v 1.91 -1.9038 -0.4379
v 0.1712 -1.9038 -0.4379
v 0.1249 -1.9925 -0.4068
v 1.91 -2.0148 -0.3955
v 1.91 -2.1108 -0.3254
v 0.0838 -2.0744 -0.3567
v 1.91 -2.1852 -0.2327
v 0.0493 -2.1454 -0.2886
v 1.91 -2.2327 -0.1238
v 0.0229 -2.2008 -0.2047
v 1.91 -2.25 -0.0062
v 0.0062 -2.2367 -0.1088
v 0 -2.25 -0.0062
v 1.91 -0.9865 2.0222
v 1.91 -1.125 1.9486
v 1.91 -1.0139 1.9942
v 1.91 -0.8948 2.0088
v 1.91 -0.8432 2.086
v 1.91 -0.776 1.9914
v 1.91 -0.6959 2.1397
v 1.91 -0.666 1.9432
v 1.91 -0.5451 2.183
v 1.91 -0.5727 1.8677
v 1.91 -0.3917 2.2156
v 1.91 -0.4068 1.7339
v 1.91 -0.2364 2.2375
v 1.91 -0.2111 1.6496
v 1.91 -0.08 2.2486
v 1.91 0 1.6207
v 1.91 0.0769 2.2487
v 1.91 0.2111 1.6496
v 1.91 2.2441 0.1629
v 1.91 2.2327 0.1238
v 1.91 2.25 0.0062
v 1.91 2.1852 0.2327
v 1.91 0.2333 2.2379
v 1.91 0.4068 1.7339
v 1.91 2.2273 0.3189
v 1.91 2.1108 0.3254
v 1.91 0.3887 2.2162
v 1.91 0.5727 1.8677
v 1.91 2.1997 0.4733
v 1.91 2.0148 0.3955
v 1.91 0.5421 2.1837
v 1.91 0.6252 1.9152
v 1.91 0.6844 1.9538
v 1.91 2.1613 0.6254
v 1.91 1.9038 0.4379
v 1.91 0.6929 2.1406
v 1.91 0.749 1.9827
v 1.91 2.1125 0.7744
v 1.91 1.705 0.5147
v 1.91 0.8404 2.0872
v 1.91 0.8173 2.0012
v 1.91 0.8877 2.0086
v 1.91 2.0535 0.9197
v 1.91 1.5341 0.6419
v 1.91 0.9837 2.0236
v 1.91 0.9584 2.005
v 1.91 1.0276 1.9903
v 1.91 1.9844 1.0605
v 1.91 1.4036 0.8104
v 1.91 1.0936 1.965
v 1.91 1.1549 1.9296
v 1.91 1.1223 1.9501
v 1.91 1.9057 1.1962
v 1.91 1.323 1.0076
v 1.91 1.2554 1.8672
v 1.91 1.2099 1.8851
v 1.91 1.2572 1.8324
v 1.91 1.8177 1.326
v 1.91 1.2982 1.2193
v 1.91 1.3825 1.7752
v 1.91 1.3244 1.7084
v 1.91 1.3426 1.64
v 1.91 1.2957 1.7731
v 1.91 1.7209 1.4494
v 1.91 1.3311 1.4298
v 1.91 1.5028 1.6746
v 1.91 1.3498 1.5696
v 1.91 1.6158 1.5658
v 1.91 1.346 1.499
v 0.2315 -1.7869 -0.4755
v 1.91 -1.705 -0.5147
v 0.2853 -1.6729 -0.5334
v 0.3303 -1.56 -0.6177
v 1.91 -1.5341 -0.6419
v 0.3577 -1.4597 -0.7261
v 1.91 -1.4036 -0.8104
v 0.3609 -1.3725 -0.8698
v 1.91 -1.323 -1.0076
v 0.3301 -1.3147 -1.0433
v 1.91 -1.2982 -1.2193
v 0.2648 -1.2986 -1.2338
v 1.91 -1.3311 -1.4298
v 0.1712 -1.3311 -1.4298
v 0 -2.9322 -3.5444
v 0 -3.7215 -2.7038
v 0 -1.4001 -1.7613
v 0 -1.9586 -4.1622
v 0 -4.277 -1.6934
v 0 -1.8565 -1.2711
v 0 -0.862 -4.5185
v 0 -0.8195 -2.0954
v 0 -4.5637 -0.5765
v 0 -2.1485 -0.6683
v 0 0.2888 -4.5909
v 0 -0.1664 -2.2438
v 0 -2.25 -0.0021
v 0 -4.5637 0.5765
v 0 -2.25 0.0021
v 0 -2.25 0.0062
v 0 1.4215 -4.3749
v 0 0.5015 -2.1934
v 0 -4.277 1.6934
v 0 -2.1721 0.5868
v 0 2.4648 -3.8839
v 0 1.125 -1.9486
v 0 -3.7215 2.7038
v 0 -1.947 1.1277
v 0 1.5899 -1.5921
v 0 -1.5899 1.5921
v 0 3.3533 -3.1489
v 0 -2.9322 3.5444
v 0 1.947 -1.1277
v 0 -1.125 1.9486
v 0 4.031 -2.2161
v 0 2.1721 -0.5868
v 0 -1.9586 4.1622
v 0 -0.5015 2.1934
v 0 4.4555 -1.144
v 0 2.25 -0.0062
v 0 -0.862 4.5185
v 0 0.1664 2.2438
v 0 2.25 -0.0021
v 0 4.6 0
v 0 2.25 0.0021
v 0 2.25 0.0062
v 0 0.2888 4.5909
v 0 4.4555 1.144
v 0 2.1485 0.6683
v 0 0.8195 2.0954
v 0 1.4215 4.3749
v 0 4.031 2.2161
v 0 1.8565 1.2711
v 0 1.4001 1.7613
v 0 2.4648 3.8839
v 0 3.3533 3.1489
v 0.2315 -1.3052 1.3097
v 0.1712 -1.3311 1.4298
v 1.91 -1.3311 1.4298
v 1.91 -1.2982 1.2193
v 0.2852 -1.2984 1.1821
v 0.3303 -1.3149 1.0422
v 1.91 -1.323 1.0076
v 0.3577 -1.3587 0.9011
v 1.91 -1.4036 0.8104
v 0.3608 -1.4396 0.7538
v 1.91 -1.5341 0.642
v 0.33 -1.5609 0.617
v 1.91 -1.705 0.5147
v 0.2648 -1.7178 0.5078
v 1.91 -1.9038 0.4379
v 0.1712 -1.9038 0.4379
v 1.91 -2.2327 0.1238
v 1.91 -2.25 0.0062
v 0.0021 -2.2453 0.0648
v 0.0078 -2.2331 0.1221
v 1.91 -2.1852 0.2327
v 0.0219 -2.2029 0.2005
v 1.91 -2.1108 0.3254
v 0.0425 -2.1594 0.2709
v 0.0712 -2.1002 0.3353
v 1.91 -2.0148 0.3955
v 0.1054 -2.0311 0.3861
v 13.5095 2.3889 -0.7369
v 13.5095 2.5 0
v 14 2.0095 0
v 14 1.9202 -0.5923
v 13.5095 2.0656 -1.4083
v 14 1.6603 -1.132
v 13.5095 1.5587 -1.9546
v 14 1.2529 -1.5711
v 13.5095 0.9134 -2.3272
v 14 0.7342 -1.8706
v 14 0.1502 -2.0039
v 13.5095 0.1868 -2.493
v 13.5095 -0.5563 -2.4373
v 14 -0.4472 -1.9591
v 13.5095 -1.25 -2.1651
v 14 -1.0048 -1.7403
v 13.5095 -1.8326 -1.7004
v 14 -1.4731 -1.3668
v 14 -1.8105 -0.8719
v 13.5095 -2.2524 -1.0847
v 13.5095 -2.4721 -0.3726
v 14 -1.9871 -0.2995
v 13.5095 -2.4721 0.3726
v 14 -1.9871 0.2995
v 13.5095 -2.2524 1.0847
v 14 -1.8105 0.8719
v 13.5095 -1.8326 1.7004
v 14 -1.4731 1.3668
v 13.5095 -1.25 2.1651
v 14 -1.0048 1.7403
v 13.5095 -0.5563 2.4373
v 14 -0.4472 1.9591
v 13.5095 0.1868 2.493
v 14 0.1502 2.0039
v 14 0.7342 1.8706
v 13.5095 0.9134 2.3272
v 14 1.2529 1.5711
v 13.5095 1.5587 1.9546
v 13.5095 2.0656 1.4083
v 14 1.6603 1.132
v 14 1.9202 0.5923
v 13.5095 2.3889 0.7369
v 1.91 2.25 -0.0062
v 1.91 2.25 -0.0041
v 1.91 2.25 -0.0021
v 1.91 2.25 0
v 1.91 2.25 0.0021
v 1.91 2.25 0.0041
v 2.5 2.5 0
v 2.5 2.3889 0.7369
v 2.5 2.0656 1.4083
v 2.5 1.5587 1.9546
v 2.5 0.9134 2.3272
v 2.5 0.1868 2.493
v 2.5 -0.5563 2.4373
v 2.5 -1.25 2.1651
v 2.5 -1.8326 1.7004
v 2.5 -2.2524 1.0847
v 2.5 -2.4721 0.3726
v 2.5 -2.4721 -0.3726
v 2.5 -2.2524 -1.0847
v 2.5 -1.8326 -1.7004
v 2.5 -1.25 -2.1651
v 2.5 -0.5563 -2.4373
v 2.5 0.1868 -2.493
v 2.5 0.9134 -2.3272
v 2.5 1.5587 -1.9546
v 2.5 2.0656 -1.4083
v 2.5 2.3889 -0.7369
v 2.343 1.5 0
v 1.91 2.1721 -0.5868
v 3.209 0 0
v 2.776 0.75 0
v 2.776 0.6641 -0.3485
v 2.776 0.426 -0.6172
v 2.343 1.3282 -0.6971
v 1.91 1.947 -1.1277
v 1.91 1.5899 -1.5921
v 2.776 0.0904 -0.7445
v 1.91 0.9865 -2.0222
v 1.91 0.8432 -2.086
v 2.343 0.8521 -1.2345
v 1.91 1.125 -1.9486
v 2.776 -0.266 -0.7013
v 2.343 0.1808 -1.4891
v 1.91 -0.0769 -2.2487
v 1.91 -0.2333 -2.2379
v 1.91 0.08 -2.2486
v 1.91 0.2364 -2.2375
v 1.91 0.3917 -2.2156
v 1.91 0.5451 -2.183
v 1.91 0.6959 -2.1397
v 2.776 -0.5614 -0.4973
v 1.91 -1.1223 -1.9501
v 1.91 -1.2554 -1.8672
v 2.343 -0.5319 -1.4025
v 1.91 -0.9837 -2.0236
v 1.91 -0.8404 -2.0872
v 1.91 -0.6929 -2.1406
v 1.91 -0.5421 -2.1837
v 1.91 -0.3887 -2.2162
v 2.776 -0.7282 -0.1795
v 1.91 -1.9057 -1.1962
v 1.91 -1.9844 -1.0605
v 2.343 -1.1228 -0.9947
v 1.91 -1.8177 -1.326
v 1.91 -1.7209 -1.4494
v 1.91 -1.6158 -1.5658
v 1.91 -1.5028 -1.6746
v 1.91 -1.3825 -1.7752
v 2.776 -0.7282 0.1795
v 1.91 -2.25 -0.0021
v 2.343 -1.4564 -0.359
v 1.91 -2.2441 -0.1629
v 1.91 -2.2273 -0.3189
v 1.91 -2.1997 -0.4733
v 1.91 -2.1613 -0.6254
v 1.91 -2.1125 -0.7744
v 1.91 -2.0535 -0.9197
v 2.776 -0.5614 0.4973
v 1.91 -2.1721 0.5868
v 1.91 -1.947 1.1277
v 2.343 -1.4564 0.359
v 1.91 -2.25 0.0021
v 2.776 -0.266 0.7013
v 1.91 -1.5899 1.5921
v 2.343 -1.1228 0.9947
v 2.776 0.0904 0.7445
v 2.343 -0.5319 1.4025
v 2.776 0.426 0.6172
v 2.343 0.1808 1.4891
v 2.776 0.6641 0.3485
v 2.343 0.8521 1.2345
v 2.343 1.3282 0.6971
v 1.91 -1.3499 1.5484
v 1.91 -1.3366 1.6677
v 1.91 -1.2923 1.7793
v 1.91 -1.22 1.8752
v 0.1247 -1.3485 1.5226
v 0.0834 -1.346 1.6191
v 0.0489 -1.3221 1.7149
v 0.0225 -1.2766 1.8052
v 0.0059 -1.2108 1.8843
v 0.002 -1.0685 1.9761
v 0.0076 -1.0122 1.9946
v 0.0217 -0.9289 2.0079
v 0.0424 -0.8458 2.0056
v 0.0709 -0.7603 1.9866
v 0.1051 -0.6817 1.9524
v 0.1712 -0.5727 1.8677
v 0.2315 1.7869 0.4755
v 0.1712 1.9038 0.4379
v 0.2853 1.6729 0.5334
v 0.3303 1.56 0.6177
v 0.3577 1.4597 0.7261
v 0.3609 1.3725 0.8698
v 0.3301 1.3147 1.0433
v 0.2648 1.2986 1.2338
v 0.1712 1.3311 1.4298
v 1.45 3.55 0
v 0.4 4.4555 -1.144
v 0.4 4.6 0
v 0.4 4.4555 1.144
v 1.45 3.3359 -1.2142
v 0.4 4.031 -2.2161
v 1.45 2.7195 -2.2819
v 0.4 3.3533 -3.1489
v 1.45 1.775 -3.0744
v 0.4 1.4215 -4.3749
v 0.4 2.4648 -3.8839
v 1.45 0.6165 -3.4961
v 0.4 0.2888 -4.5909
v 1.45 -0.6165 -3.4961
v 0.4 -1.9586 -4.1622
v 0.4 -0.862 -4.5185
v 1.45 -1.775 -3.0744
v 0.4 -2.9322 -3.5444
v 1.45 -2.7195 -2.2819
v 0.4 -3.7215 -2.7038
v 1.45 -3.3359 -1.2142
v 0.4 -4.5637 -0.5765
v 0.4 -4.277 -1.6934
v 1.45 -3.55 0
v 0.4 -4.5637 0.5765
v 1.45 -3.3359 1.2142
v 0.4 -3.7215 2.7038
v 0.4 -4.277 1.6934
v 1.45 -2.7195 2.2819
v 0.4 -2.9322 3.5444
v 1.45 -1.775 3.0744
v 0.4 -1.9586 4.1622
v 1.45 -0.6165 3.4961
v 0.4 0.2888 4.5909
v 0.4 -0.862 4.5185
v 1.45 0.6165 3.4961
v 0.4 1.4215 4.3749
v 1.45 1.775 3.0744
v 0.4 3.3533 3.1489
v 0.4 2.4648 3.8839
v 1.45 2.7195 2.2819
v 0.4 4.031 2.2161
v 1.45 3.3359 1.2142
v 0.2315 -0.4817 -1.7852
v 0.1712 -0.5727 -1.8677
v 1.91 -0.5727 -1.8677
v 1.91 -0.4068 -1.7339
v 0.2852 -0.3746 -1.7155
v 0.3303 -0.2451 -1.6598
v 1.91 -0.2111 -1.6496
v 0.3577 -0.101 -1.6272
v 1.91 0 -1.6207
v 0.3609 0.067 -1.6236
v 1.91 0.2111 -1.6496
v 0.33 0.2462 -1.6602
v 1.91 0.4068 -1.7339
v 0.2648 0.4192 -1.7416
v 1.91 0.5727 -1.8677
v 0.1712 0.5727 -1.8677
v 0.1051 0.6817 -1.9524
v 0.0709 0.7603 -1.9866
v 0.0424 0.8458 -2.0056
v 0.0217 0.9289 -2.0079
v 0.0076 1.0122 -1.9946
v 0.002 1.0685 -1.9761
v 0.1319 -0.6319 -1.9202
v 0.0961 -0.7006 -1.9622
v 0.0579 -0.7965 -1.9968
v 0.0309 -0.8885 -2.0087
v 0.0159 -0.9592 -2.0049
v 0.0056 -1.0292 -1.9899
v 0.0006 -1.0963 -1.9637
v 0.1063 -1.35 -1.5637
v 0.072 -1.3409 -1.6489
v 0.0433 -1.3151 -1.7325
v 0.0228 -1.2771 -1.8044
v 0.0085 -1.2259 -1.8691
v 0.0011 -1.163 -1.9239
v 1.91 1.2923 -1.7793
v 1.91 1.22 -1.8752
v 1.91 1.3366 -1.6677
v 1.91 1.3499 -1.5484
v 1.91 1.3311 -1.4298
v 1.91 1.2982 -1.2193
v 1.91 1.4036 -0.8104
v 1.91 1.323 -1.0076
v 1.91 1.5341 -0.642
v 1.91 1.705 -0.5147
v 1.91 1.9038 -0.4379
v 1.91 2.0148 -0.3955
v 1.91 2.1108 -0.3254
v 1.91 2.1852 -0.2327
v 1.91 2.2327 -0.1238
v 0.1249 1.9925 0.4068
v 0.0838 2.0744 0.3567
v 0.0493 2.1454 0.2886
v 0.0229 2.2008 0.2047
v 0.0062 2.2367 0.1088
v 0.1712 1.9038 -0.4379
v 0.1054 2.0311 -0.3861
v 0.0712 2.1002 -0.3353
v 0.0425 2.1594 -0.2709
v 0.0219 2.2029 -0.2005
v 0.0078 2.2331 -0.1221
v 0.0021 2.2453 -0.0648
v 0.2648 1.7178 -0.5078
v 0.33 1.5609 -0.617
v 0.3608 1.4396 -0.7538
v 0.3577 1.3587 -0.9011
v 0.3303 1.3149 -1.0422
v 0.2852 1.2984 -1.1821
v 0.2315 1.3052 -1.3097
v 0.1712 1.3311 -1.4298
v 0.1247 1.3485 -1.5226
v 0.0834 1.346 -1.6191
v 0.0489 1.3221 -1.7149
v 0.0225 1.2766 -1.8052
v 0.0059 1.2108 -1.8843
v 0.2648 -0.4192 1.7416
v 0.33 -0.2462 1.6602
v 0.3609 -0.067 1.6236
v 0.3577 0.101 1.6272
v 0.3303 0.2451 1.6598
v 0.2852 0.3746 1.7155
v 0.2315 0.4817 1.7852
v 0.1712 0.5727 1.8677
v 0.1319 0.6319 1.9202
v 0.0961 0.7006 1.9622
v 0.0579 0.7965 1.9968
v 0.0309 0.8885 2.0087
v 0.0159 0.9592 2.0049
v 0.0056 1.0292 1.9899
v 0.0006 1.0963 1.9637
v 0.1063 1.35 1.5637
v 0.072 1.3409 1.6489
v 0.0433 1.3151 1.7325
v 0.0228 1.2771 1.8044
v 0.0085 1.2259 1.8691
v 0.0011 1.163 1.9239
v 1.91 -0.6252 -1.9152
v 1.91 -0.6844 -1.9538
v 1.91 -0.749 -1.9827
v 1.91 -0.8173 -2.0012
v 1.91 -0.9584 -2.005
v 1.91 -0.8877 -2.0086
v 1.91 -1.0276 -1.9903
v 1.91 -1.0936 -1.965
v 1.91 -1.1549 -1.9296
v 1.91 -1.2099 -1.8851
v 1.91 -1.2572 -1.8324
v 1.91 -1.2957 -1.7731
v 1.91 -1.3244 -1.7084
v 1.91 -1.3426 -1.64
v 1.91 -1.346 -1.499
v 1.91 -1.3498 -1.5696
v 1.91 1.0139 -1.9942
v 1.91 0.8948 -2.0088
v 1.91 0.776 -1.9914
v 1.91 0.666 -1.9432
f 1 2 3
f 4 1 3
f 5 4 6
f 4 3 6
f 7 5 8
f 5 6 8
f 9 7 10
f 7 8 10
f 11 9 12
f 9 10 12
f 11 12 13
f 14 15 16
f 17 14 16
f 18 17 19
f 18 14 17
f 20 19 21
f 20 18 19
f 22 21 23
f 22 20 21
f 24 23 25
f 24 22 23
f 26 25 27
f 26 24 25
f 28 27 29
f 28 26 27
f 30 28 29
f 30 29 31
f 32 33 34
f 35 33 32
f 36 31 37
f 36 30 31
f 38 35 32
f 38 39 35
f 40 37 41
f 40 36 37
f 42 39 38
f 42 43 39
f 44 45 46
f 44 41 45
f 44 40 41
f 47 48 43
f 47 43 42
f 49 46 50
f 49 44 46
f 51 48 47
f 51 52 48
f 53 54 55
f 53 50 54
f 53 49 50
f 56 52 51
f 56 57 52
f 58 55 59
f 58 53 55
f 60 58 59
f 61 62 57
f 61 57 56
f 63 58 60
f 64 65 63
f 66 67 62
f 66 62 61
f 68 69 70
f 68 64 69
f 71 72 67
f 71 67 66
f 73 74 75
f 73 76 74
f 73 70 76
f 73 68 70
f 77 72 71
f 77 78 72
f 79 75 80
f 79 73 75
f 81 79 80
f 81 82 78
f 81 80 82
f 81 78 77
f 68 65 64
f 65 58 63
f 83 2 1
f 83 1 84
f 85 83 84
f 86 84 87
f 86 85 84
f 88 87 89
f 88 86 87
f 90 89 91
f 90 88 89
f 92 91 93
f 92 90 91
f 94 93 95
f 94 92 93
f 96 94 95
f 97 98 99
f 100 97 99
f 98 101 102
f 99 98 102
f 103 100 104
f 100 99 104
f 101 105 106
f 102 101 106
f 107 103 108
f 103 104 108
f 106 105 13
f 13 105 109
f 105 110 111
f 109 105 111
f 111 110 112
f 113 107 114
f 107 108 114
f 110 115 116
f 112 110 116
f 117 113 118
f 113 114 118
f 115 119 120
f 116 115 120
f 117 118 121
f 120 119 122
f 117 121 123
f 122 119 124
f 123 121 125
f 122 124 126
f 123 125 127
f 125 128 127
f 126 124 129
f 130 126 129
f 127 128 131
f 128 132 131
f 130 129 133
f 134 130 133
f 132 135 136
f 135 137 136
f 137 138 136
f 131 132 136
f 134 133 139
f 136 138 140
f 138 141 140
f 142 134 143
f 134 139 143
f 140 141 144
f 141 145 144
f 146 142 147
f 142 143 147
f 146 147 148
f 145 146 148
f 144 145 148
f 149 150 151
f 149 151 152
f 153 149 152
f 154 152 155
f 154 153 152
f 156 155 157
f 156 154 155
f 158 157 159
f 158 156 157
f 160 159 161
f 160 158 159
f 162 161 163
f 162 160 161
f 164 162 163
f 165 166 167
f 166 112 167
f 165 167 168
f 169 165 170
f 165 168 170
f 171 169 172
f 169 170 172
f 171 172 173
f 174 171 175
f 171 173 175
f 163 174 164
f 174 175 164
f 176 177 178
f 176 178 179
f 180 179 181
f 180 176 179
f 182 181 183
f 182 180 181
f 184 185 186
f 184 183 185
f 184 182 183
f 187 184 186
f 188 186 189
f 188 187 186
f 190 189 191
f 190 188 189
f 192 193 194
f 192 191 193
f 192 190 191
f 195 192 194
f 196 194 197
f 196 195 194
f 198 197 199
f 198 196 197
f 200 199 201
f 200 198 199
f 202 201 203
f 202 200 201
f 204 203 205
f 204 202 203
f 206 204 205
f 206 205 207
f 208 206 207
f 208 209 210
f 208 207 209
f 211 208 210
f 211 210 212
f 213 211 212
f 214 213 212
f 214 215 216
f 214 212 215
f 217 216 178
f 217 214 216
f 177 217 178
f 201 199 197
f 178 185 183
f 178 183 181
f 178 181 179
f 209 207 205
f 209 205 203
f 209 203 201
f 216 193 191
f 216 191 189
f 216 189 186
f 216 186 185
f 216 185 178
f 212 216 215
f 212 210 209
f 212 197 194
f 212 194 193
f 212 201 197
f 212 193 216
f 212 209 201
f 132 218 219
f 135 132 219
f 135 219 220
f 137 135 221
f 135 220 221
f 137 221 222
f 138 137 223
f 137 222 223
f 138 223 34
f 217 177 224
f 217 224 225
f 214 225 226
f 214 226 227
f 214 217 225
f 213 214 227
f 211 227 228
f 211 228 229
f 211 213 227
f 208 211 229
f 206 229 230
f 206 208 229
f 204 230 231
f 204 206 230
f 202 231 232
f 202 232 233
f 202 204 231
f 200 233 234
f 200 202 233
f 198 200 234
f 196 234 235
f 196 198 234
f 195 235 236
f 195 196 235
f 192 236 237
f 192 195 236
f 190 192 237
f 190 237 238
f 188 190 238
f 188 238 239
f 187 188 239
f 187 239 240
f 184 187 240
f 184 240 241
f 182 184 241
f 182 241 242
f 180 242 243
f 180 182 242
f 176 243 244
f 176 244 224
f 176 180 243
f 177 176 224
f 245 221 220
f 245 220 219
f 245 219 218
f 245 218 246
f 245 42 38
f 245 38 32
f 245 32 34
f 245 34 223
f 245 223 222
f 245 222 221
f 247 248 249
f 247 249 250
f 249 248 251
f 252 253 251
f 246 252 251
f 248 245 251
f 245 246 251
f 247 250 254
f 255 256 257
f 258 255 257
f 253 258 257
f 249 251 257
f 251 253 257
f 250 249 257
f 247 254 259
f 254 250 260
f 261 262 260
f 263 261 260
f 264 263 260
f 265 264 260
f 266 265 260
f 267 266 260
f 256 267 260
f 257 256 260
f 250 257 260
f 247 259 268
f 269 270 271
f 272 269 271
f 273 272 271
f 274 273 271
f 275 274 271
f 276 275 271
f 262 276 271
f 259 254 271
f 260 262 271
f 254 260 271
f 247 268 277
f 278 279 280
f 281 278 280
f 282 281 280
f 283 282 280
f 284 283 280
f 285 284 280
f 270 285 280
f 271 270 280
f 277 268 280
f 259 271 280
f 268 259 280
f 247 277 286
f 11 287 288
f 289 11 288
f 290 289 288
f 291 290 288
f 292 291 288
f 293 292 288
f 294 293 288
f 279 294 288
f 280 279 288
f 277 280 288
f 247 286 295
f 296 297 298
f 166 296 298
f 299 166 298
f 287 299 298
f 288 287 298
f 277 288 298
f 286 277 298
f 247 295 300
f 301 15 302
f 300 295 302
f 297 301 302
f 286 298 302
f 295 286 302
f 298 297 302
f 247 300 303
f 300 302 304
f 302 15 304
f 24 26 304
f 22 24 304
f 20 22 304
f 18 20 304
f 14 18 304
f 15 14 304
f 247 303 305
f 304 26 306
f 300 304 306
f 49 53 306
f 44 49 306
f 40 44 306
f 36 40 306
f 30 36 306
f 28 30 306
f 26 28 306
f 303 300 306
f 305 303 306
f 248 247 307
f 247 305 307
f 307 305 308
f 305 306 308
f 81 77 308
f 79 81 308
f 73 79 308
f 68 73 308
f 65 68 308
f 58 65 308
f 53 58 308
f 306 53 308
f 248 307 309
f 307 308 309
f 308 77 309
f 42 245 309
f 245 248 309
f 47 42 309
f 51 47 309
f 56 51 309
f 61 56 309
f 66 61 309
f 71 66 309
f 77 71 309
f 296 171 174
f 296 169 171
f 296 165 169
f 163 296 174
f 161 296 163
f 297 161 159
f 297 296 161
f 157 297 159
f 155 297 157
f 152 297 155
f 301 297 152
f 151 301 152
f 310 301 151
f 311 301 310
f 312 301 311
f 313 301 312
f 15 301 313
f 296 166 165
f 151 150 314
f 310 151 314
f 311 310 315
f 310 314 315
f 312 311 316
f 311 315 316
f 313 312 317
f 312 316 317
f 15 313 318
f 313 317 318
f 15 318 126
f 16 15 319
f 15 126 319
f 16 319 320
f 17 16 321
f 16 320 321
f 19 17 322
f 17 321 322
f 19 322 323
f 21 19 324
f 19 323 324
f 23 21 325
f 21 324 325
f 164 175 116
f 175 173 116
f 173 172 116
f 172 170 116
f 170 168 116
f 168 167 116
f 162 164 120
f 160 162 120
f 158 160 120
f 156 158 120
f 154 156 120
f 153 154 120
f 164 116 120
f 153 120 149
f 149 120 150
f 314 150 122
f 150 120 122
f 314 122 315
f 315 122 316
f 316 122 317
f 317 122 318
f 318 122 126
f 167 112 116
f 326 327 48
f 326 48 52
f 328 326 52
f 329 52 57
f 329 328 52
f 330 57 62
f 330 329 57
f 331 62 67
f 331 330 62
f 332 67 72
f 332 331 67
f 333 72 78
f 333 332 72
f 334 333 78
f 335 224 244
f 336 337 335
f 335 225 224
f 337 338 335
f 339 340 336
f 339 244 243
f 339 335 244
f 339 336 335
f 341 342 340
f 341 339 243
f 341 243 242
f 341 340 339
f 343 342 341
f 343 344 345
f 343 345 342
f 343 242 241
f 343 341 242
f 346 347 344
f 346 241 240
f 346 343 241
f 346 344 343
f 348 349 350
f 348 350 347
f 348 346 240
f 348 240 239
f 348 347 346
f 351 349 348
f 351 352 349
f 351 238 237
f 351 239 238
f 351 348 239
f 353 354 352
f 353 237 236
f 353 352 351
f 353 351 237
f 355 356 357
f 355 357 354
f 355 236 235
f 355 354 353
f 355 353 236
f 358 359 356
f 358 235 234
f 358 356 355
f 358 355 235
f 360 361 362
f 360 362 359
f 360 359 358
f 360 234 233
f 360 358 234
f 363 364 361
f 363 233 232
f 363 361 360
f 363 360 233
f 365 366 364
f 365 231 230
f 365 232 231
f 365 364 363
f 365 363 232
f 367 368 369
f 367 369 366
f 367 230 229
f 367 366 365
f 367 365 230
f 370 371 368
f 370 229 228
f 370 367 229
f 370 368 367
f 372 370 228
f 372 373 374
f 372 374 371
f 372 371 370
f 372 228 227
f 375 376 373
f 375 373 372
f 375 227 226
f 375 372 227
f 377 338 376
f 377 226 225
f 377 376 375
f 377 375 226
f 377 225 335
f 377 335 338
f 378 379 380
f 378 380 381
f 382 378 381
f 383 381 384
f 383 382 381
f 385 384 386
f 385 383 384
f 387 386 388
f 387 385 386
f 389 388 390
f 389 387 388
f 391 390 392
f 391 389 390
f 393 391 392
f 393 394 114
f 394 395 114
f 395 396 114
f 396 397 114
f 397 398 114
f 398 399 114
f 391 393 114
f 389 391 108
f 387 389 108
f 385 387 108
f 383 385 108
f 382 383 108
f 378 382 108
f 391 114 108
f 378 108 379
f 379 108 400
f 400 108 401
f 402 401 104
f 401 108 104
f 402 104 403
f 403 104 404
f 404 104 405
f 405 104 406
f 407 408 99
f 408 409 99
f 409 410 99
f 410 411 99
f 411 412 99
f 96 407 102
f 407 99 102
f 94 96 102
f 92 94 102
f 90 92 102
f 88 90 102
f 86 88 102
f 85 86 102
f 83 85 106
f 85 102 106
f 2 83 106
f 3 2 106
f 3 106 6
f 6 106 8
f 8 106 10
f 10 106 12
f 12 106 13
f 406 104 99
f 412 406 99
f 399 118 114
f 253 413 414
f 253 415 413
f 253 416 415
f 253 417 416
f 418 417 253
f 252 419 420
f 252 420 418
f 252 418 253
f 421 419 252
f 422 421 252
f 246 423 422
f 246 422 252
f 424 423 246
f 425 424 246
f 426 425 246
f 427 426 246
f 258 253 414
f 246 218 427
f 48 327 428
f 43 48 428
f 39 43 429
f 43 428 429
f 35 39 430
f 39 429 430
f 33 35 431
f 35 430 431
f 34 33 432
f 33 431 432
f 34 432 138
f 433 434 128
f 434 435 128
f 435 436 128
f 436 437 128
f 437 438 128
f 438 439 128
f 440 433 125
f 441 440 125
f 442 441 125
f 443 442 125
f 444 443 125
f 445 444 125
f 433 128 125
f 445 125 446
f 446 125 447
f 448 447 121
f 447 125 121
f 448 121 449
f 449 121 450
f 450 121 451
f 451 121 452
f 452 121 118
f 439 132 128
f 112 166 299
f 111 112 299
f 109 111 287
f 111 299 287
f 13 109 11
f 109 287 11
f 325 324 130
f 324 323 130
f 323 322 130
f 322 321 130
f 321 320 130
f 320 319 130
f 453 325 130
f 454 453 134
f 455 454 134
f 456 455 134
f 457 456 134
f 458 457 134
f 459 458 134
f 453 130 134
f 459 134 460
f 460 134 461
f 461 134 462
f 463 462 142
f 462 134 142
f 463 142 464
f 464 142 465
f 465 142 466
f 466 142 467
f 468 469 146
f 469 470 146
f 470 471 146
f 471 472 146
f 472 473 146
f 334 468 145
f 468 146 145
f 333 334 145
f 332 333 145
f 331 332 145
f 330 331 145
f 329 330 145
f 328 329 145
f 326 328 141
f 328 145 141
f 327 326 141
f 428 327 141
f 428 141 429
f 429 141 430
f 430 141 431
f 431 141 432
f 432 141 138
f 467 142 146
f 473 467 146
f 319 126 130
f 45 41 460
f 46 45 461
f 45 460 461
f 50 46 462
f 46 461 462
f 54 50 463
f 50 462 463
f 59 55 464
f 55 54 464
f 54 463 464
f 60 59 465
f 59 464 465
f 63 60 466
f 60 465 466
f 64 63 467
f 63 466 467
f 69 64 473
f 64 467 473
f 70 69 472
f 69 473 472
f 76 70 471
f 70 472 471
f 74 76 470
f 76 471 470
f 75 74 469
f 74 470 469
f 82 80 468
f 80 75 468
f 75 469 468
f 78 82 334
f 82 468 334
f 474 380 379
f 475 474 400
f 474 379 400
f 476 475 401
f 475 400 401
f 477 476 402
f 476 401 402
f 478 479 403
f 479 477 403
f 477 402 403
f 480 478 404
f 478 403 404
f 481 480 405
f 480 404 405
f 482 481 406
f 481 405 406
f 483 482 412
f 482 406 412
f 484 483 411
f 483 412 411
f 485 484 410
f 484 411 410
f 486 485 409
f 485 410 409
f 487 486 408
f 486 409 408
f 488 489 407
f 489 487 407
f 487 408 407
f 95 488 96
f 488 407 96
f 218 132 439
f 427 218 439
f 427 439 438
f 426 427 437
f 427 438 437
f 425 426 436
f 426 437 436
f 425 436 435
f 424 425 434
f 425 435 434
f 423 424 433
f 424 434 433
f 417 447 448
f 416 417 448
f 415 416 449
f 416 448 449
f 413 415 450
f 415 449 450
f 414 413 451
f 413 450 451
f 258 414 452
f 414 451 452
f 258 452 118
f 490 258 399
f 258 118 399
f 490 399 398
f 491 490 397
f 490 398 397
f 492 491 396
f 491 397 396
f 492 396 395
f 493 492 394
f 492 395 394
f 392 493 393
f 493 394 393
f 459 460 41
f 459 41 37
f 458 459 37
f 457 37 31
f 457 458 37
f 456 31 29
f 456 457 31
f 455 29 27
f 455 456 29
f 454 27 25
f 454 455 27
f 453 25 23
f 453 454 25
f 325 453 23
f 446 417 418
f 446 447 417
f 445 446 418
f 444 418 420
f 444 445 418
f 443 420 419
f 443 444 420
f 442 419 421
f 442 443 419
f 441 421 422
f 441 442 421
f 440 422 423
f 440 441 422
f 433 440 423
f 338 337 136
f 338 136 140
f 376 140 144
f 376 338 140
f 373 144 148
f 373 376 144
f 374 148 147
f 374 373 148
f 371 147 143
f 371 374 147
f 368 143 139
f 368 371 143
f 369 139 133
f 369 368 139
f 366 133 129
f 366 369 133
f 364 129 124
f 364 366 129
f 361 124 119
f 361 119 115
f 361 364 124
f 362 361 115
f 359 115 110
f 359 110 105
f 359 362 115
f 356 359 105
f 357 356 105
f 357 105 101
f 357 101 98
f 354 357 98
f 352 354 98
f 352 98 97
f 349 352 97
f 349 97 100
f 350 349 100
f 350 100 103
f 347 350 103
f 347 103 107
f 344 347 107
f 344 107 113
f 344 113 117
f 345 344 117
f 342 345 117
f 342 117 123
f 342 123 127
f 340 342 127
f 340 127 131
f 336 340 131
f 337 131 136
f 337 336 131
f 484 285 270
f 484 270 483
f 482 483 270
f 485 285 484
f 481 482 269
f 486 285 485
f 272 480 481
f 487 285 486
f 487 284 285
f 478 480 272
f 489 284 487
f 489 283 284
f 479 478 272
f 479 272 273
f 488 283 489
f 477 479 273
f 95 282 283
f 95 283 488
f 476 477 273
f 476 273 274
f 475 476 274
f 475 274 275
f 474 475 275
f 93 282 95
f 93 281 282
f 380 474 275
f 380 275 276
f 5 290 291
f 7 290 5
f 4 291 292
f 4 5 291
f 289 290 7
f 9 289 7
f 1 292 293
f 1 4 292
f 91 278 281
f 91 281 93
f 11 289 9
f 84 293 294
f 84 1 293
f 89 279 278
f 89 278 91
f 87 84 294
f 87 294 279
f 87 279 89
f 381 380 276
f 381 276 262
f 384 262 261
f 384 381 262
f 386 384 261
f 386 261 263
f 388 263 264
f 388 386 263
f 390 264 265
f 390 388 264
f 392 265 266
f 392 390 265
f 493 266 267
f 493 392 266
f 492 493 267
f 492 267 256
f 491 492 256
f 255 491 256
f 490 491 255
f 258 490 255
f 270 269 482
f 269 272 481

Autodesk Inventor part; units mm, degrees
sketch "Skizze_5" plane through (0, 0, 0) normal (0, 0, 1) x (1, 0, 0)
  line L0 (14, 0) -> (0, 0)
  line L1 (0, 0) -> (0, 4.6)
  line L2 (0, 4.6) -> (0.4, 4.6)
  line L3 (0.4, 4.6) -> (2.5, 2.5)
  line L4 (2.5, 2.5) -> (13.5095, 2.5)
  line L5 (13.5095, 2.5) -> (14, 2.0095)
  line L6 (14, 2.0095) -> (14, 0)
  line L7 (14, 0) -> (0, 0)
revolve "Revolution1" add sketch "Skizze_5" angle 360 about axis through (14, 0, 0) along (1, 0, 0)
thread "Thread1" size "M5x0.8" class "6g" standard "ISO Metric profile" length 9.4095
sketch "Sketch_1" plane through (0, 0, 0) normal (0, 0, 1) x (1, 0, 0)
  line L0 (1.91, 0) -> (0, 0)
  line L1 (0, 0) -> (0, 2.25)
  line L2 (0, 2.25) -> (1.91, 2.25)
  line L3 (1.91, 2.25) -> (1.91, 0)
  line L4 (1.91, 0) -> (0, 0)
revolve "Revolution2" cut sketch "Sketch_1" angle 360 about axis through (1.91, 0, 0) along (1, 0, 0)
sketch "Sketch_2" plane through (0, 0, 0) normal (0, 0, 1) x (1, 0, 0)
  line L0 (3.209, 0) -> (1.91, 0)
  line L1 (1.91, 0) -> (1.91, 2.25)
  line L2 (1.91, 2.25) -> (3.209, 0)
  line L3 (3.209, 0) -> (1.91, 0)
revolve "Revolution3" cut sketch "Sketch_2" angle 360 about axis through (3.209, 0, 0) along (1, 0, 0)
sketch "Sketch_3" plane through (0, 0, 0) normal (1, 0, 0) x (0, 1, 0)
  circle A0 centre (0, 0) radius 2.7
  arc A1 (-0.5727, 1.8677) -> (-1.3311, 1.4298) centre (-0.9, 1.5588) ccw
  arc A2 (-1.9038, 0.4379) -> (-1.3311, 1.4298) centre (-2.0856, 1.2041) ccw
  arc A3 (-1.9038, 0.4379) -> (-1.9038, -0.4379) centre (-1.8, 0) ccw
  arc A4 (-1.3311, -1.4298) -> (-1.9038, -0.4379) centre (-2.0856, -1.2041) ccw
  arc A5 (-1.3311, -1.4298) -> (-0.5727, -1.8677) centre (-0.9, -1.5588) ccw
  arc A6 (0.5727, -1.8677) -> (-0.5727, -1.8677) centre (0, -2.4082) ccw
  arc A7 (0.5727, -1.8677) -> (1.3311, -1.4298) centre (0.9, -1.5588) ccw
  arc A8 (1.9038, -0.4379) -> (1.3311, -1.4298) centre (2.0856, -1.2041) ccw
  arc A9 (1.9038, -0.4379) -> (1.9038, 0.4379) centre (1.8, 0) ccw
  arc A10 (1.3311, 1.4298) -> (1.9038, 0.4379) centre (2.0856, 1.2041) ccw
  arc A11 (1.3311, 1.4298) -> (0.5727, 1.8677) centre (0.9, 1.5588) ccw
  arc A12 (-0.5727, 1.8677) -> (0.5727, 1.8677) centre (0, 2.4082) ccw
extrude "Extrusion1" add sketch "Sketch_3" along normal blind 1.91
sketch "Sketch_4" plane through (0, 0, 0) normal (0, 0, 1) x (1, 0, 0)
  line L0 (1.299, 0) -> (-1.91, 0)
  line L1 (-1.91, 0) -> (-1.91, 2.25)
  line L2 (-1.91, 2.25) -> (0, 2.25)
  line L3 (0, 2.25) -> (1.299, 0)
  line L4 (1.299, 0) -> (-1.91, 0)
revolve "Revolution4" cut sketch "Sketch_4" angle 360 about axis through (1.299, 0, 0) along (1, 0, 0)
ref_plane "IP1_XY" through (0, 0, 0) normal (1, 0, 0) x (0, 0, -1)
ref_plane "IP1_YZ" through (0, 0, 0) normal (0, 0, -1) x (0, 1, 0)
ref_plane "IP1_ZX" through (0, 0, 0) normal (0, 1, 0) x (1, 0, 0)
ref_plane "IP2_XY" through (2.5, 0, 0) normal (1, 0, 0) x (0, 0, -1)
ref_plane "IP2_YZ" through (2.5, 0, 0) normal (0, 0, -1) x (0, 1, 0)
ref_plane "IP2_ZX" through (2.5, 0, 0) normal (0, 1, 0) x (1, 0, 0)
ref_plane "IP3_XY" through (14, 0, 0) normal (1, 0, 0) x (0, 0, -1)
ref_plane "IP3_YZ" through (14, 0, 0) normal (0, 0, -1) x (0, 1, 0)
ref_plane "IP3_ZX" through (14, 0, 0) normal (0, 1, 0) x (1, 0, 0)
properties part number "Senkschraube DIN ≈965 M5x14 51305.050.014(High)"
